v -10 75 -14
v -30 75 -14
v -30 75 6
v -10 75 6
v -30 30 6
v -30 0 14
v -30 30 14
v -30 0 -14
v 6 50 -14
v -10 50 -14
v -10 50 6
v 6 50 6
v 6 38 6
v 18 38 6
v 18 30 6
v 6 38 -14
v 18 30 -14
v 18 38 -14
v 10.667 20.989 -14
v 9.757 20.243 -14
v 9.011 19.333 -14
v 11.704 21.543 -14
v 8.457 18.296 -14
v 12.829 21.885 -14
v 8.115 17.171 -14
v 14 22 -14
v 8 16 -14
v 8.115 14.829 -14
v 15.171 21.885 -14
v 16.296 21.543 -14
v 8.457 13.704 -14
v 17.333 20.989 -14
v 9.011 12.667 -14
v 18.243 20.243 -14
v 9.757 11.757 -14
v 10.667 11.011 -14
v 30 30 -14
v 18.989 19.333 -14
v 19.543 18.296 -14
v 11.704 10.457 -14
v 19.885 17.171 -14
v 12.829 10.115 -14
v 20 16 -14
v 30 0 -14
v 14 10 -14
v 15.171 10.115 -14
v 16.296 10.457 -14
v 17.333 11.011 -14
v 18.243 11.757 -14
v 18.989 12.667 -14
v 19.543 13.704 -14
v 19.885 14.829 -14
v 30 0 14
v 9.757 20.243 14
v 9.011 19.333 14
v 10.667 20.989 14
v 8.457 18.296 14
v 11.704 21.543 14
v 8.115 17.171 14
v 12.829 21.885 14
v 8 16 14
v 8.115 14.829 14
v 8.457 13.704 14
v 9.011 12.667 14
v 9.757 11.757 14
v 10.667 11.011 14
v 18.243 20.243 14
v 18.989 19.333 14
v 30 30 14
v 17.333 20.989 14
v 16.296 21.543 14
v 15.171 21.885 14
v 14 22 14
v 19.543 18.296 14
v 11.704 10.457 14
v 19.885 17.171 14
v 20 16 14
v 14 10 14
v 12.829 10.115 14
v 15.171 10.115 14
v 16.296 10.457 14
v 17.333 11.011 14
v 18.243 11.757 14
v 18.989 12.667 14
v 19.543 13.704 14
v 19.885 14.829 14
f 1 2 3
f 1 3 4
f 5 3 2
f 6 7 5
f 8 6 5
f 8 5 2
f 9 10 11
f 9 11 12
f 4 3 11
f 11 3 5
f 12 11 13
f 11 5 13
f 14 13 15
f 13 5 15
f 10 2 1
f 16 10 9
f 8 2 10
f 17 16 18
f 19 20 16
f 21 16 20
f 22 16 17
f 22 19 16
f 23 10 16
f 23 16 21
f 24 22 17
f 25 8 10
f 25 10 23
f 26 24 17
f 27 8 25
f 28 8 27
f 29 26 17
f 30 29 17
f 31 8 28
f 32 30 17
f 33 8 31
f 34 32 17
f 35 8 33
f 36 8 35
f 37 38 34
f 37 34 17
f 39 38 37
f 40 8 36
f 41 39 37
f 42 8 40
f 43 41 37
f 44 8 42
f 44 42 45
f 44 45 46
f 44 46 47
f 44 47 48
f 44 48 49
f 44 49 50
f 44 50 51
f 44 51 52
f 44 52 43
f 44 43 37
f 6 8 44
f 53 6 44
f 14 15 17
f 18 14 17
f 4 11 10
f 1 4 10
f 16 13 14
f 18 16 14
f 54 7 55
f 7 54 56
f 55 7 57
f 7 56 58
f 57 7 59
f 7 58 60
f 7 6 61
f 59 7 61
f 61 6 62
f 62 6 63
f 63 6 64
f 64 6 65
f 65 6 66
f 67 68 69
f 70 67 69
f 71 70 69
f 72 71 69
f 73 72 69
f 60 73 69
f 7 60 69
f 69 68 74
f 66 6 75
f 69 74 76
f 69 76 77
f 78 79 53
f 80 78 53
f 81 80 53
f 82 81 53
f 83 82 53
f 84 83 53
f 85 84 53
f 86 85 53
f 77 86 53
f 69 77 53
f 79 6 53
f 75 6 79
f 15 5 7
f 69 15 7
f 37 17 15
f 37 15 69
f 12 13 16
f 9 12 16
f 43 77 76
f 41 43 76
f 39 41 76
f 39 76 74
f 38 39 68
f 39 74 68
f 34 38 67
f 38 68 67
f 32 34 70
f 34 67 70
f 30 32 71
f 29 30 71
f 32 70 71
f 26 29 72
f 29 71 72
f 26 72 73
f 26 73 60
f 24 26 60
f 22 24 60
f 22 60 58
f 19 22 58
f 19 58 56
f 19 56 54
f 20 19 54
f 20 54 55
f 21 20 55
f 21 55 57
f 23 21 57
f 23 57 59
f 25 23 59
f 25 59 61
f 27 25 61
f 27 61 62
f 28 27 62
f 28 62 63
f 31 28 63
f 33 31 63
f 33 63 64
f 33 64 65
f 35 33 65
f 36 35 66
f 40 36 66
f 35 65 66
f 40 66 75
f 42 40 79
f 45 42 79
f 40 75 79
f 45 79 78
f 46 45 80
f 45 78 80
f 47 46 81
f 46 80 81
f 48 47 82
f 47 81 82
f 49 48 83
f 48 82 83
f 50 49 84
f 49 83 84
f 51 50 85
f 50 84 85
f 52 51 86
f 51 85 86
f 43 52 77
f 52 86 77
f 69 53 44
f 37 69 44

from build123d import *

# Parameters (mm, degrees)
SKETCH2_W           = 60
SKETCH2_H           = 28
BOSS_EXTRUDE1_DEPTH = 30
SKETCH3_R           = 6
CUT_EXTRUDE1_DEPTH  = 47
SKETCH4_W           = 48
SKETCH4_H           = 20
BOSS_EXTRUDE2_DEPTH = 8
SKETCH5_W           = 36
SKETCH5_H           = 20
BOSS_EXTRUDE3_DEPTH = 12
SKETCH6_W           = 20
SKETCH6_H           = 20
BOSS_EXTRUDE4_DEPTH = 25


with BuildPart() as part:
    # Sketch2 → Boss-Extrude1 (new body)
    with BuildSketch(Plane(origin=(0, 0, 0), x_dir=(1, 0, 0), z_dir=(0, 1, 0))):
        Rectangle(SKETCH2_W, SKETCH2_H)
    extrude(amount=BOSS_EXTRUDE1_DEPTH)

    # Sketch3 → Cut-Extrude1 (cut)
    with BuildSketch(Plane.XY.offset(14)):
        with Locations((14, 16)):
            Circle(SKETCH3_R)
    extrude(amount=-CUT_EXTRUDE1_DEPTH, mode=Mode.SUBTRACT)

    # Sketch4 → Boss-Extrude2 (add)
    with BuildSketch(Plane(origin=(0, 30, 0), x_dir=(1, 0, 0), z_dir=(0, 1, 0))):
        with Locations((-6, 4)):
            Rectangle(SKETCH4_W, SKETCH4_H)
    extrude(amount=BOSS_EXTRUDE2_DEPTH)

    # Sketch5 → Boss-Extrude3 (add)
    with BuildSketch(Plane(origin=(0, 38, 0), x_dir=(1, 0, 0), z_dir=(0, 1, 0))):
        with Locations((-12, 4)):
            Rectangle(SKETCH5_W, SKETCH5_H)
    extrude(amount=BOSS_EXTRUDE3_DEPTH)

    # Sketch6 → Boss-Extrude4 (add)
    with BuildSketch(Plane(origin=(0, 50, 0), x_dir=(1, 0, 0), z_dir=(0, 1, 0))):
        with Locations((-20, 4)):
            Rectangle(SKETCH6_W, SKETCH6_H)
    extrude(amount=BOSS_EXTRUDE4_DEPTH)


solid = part.part
